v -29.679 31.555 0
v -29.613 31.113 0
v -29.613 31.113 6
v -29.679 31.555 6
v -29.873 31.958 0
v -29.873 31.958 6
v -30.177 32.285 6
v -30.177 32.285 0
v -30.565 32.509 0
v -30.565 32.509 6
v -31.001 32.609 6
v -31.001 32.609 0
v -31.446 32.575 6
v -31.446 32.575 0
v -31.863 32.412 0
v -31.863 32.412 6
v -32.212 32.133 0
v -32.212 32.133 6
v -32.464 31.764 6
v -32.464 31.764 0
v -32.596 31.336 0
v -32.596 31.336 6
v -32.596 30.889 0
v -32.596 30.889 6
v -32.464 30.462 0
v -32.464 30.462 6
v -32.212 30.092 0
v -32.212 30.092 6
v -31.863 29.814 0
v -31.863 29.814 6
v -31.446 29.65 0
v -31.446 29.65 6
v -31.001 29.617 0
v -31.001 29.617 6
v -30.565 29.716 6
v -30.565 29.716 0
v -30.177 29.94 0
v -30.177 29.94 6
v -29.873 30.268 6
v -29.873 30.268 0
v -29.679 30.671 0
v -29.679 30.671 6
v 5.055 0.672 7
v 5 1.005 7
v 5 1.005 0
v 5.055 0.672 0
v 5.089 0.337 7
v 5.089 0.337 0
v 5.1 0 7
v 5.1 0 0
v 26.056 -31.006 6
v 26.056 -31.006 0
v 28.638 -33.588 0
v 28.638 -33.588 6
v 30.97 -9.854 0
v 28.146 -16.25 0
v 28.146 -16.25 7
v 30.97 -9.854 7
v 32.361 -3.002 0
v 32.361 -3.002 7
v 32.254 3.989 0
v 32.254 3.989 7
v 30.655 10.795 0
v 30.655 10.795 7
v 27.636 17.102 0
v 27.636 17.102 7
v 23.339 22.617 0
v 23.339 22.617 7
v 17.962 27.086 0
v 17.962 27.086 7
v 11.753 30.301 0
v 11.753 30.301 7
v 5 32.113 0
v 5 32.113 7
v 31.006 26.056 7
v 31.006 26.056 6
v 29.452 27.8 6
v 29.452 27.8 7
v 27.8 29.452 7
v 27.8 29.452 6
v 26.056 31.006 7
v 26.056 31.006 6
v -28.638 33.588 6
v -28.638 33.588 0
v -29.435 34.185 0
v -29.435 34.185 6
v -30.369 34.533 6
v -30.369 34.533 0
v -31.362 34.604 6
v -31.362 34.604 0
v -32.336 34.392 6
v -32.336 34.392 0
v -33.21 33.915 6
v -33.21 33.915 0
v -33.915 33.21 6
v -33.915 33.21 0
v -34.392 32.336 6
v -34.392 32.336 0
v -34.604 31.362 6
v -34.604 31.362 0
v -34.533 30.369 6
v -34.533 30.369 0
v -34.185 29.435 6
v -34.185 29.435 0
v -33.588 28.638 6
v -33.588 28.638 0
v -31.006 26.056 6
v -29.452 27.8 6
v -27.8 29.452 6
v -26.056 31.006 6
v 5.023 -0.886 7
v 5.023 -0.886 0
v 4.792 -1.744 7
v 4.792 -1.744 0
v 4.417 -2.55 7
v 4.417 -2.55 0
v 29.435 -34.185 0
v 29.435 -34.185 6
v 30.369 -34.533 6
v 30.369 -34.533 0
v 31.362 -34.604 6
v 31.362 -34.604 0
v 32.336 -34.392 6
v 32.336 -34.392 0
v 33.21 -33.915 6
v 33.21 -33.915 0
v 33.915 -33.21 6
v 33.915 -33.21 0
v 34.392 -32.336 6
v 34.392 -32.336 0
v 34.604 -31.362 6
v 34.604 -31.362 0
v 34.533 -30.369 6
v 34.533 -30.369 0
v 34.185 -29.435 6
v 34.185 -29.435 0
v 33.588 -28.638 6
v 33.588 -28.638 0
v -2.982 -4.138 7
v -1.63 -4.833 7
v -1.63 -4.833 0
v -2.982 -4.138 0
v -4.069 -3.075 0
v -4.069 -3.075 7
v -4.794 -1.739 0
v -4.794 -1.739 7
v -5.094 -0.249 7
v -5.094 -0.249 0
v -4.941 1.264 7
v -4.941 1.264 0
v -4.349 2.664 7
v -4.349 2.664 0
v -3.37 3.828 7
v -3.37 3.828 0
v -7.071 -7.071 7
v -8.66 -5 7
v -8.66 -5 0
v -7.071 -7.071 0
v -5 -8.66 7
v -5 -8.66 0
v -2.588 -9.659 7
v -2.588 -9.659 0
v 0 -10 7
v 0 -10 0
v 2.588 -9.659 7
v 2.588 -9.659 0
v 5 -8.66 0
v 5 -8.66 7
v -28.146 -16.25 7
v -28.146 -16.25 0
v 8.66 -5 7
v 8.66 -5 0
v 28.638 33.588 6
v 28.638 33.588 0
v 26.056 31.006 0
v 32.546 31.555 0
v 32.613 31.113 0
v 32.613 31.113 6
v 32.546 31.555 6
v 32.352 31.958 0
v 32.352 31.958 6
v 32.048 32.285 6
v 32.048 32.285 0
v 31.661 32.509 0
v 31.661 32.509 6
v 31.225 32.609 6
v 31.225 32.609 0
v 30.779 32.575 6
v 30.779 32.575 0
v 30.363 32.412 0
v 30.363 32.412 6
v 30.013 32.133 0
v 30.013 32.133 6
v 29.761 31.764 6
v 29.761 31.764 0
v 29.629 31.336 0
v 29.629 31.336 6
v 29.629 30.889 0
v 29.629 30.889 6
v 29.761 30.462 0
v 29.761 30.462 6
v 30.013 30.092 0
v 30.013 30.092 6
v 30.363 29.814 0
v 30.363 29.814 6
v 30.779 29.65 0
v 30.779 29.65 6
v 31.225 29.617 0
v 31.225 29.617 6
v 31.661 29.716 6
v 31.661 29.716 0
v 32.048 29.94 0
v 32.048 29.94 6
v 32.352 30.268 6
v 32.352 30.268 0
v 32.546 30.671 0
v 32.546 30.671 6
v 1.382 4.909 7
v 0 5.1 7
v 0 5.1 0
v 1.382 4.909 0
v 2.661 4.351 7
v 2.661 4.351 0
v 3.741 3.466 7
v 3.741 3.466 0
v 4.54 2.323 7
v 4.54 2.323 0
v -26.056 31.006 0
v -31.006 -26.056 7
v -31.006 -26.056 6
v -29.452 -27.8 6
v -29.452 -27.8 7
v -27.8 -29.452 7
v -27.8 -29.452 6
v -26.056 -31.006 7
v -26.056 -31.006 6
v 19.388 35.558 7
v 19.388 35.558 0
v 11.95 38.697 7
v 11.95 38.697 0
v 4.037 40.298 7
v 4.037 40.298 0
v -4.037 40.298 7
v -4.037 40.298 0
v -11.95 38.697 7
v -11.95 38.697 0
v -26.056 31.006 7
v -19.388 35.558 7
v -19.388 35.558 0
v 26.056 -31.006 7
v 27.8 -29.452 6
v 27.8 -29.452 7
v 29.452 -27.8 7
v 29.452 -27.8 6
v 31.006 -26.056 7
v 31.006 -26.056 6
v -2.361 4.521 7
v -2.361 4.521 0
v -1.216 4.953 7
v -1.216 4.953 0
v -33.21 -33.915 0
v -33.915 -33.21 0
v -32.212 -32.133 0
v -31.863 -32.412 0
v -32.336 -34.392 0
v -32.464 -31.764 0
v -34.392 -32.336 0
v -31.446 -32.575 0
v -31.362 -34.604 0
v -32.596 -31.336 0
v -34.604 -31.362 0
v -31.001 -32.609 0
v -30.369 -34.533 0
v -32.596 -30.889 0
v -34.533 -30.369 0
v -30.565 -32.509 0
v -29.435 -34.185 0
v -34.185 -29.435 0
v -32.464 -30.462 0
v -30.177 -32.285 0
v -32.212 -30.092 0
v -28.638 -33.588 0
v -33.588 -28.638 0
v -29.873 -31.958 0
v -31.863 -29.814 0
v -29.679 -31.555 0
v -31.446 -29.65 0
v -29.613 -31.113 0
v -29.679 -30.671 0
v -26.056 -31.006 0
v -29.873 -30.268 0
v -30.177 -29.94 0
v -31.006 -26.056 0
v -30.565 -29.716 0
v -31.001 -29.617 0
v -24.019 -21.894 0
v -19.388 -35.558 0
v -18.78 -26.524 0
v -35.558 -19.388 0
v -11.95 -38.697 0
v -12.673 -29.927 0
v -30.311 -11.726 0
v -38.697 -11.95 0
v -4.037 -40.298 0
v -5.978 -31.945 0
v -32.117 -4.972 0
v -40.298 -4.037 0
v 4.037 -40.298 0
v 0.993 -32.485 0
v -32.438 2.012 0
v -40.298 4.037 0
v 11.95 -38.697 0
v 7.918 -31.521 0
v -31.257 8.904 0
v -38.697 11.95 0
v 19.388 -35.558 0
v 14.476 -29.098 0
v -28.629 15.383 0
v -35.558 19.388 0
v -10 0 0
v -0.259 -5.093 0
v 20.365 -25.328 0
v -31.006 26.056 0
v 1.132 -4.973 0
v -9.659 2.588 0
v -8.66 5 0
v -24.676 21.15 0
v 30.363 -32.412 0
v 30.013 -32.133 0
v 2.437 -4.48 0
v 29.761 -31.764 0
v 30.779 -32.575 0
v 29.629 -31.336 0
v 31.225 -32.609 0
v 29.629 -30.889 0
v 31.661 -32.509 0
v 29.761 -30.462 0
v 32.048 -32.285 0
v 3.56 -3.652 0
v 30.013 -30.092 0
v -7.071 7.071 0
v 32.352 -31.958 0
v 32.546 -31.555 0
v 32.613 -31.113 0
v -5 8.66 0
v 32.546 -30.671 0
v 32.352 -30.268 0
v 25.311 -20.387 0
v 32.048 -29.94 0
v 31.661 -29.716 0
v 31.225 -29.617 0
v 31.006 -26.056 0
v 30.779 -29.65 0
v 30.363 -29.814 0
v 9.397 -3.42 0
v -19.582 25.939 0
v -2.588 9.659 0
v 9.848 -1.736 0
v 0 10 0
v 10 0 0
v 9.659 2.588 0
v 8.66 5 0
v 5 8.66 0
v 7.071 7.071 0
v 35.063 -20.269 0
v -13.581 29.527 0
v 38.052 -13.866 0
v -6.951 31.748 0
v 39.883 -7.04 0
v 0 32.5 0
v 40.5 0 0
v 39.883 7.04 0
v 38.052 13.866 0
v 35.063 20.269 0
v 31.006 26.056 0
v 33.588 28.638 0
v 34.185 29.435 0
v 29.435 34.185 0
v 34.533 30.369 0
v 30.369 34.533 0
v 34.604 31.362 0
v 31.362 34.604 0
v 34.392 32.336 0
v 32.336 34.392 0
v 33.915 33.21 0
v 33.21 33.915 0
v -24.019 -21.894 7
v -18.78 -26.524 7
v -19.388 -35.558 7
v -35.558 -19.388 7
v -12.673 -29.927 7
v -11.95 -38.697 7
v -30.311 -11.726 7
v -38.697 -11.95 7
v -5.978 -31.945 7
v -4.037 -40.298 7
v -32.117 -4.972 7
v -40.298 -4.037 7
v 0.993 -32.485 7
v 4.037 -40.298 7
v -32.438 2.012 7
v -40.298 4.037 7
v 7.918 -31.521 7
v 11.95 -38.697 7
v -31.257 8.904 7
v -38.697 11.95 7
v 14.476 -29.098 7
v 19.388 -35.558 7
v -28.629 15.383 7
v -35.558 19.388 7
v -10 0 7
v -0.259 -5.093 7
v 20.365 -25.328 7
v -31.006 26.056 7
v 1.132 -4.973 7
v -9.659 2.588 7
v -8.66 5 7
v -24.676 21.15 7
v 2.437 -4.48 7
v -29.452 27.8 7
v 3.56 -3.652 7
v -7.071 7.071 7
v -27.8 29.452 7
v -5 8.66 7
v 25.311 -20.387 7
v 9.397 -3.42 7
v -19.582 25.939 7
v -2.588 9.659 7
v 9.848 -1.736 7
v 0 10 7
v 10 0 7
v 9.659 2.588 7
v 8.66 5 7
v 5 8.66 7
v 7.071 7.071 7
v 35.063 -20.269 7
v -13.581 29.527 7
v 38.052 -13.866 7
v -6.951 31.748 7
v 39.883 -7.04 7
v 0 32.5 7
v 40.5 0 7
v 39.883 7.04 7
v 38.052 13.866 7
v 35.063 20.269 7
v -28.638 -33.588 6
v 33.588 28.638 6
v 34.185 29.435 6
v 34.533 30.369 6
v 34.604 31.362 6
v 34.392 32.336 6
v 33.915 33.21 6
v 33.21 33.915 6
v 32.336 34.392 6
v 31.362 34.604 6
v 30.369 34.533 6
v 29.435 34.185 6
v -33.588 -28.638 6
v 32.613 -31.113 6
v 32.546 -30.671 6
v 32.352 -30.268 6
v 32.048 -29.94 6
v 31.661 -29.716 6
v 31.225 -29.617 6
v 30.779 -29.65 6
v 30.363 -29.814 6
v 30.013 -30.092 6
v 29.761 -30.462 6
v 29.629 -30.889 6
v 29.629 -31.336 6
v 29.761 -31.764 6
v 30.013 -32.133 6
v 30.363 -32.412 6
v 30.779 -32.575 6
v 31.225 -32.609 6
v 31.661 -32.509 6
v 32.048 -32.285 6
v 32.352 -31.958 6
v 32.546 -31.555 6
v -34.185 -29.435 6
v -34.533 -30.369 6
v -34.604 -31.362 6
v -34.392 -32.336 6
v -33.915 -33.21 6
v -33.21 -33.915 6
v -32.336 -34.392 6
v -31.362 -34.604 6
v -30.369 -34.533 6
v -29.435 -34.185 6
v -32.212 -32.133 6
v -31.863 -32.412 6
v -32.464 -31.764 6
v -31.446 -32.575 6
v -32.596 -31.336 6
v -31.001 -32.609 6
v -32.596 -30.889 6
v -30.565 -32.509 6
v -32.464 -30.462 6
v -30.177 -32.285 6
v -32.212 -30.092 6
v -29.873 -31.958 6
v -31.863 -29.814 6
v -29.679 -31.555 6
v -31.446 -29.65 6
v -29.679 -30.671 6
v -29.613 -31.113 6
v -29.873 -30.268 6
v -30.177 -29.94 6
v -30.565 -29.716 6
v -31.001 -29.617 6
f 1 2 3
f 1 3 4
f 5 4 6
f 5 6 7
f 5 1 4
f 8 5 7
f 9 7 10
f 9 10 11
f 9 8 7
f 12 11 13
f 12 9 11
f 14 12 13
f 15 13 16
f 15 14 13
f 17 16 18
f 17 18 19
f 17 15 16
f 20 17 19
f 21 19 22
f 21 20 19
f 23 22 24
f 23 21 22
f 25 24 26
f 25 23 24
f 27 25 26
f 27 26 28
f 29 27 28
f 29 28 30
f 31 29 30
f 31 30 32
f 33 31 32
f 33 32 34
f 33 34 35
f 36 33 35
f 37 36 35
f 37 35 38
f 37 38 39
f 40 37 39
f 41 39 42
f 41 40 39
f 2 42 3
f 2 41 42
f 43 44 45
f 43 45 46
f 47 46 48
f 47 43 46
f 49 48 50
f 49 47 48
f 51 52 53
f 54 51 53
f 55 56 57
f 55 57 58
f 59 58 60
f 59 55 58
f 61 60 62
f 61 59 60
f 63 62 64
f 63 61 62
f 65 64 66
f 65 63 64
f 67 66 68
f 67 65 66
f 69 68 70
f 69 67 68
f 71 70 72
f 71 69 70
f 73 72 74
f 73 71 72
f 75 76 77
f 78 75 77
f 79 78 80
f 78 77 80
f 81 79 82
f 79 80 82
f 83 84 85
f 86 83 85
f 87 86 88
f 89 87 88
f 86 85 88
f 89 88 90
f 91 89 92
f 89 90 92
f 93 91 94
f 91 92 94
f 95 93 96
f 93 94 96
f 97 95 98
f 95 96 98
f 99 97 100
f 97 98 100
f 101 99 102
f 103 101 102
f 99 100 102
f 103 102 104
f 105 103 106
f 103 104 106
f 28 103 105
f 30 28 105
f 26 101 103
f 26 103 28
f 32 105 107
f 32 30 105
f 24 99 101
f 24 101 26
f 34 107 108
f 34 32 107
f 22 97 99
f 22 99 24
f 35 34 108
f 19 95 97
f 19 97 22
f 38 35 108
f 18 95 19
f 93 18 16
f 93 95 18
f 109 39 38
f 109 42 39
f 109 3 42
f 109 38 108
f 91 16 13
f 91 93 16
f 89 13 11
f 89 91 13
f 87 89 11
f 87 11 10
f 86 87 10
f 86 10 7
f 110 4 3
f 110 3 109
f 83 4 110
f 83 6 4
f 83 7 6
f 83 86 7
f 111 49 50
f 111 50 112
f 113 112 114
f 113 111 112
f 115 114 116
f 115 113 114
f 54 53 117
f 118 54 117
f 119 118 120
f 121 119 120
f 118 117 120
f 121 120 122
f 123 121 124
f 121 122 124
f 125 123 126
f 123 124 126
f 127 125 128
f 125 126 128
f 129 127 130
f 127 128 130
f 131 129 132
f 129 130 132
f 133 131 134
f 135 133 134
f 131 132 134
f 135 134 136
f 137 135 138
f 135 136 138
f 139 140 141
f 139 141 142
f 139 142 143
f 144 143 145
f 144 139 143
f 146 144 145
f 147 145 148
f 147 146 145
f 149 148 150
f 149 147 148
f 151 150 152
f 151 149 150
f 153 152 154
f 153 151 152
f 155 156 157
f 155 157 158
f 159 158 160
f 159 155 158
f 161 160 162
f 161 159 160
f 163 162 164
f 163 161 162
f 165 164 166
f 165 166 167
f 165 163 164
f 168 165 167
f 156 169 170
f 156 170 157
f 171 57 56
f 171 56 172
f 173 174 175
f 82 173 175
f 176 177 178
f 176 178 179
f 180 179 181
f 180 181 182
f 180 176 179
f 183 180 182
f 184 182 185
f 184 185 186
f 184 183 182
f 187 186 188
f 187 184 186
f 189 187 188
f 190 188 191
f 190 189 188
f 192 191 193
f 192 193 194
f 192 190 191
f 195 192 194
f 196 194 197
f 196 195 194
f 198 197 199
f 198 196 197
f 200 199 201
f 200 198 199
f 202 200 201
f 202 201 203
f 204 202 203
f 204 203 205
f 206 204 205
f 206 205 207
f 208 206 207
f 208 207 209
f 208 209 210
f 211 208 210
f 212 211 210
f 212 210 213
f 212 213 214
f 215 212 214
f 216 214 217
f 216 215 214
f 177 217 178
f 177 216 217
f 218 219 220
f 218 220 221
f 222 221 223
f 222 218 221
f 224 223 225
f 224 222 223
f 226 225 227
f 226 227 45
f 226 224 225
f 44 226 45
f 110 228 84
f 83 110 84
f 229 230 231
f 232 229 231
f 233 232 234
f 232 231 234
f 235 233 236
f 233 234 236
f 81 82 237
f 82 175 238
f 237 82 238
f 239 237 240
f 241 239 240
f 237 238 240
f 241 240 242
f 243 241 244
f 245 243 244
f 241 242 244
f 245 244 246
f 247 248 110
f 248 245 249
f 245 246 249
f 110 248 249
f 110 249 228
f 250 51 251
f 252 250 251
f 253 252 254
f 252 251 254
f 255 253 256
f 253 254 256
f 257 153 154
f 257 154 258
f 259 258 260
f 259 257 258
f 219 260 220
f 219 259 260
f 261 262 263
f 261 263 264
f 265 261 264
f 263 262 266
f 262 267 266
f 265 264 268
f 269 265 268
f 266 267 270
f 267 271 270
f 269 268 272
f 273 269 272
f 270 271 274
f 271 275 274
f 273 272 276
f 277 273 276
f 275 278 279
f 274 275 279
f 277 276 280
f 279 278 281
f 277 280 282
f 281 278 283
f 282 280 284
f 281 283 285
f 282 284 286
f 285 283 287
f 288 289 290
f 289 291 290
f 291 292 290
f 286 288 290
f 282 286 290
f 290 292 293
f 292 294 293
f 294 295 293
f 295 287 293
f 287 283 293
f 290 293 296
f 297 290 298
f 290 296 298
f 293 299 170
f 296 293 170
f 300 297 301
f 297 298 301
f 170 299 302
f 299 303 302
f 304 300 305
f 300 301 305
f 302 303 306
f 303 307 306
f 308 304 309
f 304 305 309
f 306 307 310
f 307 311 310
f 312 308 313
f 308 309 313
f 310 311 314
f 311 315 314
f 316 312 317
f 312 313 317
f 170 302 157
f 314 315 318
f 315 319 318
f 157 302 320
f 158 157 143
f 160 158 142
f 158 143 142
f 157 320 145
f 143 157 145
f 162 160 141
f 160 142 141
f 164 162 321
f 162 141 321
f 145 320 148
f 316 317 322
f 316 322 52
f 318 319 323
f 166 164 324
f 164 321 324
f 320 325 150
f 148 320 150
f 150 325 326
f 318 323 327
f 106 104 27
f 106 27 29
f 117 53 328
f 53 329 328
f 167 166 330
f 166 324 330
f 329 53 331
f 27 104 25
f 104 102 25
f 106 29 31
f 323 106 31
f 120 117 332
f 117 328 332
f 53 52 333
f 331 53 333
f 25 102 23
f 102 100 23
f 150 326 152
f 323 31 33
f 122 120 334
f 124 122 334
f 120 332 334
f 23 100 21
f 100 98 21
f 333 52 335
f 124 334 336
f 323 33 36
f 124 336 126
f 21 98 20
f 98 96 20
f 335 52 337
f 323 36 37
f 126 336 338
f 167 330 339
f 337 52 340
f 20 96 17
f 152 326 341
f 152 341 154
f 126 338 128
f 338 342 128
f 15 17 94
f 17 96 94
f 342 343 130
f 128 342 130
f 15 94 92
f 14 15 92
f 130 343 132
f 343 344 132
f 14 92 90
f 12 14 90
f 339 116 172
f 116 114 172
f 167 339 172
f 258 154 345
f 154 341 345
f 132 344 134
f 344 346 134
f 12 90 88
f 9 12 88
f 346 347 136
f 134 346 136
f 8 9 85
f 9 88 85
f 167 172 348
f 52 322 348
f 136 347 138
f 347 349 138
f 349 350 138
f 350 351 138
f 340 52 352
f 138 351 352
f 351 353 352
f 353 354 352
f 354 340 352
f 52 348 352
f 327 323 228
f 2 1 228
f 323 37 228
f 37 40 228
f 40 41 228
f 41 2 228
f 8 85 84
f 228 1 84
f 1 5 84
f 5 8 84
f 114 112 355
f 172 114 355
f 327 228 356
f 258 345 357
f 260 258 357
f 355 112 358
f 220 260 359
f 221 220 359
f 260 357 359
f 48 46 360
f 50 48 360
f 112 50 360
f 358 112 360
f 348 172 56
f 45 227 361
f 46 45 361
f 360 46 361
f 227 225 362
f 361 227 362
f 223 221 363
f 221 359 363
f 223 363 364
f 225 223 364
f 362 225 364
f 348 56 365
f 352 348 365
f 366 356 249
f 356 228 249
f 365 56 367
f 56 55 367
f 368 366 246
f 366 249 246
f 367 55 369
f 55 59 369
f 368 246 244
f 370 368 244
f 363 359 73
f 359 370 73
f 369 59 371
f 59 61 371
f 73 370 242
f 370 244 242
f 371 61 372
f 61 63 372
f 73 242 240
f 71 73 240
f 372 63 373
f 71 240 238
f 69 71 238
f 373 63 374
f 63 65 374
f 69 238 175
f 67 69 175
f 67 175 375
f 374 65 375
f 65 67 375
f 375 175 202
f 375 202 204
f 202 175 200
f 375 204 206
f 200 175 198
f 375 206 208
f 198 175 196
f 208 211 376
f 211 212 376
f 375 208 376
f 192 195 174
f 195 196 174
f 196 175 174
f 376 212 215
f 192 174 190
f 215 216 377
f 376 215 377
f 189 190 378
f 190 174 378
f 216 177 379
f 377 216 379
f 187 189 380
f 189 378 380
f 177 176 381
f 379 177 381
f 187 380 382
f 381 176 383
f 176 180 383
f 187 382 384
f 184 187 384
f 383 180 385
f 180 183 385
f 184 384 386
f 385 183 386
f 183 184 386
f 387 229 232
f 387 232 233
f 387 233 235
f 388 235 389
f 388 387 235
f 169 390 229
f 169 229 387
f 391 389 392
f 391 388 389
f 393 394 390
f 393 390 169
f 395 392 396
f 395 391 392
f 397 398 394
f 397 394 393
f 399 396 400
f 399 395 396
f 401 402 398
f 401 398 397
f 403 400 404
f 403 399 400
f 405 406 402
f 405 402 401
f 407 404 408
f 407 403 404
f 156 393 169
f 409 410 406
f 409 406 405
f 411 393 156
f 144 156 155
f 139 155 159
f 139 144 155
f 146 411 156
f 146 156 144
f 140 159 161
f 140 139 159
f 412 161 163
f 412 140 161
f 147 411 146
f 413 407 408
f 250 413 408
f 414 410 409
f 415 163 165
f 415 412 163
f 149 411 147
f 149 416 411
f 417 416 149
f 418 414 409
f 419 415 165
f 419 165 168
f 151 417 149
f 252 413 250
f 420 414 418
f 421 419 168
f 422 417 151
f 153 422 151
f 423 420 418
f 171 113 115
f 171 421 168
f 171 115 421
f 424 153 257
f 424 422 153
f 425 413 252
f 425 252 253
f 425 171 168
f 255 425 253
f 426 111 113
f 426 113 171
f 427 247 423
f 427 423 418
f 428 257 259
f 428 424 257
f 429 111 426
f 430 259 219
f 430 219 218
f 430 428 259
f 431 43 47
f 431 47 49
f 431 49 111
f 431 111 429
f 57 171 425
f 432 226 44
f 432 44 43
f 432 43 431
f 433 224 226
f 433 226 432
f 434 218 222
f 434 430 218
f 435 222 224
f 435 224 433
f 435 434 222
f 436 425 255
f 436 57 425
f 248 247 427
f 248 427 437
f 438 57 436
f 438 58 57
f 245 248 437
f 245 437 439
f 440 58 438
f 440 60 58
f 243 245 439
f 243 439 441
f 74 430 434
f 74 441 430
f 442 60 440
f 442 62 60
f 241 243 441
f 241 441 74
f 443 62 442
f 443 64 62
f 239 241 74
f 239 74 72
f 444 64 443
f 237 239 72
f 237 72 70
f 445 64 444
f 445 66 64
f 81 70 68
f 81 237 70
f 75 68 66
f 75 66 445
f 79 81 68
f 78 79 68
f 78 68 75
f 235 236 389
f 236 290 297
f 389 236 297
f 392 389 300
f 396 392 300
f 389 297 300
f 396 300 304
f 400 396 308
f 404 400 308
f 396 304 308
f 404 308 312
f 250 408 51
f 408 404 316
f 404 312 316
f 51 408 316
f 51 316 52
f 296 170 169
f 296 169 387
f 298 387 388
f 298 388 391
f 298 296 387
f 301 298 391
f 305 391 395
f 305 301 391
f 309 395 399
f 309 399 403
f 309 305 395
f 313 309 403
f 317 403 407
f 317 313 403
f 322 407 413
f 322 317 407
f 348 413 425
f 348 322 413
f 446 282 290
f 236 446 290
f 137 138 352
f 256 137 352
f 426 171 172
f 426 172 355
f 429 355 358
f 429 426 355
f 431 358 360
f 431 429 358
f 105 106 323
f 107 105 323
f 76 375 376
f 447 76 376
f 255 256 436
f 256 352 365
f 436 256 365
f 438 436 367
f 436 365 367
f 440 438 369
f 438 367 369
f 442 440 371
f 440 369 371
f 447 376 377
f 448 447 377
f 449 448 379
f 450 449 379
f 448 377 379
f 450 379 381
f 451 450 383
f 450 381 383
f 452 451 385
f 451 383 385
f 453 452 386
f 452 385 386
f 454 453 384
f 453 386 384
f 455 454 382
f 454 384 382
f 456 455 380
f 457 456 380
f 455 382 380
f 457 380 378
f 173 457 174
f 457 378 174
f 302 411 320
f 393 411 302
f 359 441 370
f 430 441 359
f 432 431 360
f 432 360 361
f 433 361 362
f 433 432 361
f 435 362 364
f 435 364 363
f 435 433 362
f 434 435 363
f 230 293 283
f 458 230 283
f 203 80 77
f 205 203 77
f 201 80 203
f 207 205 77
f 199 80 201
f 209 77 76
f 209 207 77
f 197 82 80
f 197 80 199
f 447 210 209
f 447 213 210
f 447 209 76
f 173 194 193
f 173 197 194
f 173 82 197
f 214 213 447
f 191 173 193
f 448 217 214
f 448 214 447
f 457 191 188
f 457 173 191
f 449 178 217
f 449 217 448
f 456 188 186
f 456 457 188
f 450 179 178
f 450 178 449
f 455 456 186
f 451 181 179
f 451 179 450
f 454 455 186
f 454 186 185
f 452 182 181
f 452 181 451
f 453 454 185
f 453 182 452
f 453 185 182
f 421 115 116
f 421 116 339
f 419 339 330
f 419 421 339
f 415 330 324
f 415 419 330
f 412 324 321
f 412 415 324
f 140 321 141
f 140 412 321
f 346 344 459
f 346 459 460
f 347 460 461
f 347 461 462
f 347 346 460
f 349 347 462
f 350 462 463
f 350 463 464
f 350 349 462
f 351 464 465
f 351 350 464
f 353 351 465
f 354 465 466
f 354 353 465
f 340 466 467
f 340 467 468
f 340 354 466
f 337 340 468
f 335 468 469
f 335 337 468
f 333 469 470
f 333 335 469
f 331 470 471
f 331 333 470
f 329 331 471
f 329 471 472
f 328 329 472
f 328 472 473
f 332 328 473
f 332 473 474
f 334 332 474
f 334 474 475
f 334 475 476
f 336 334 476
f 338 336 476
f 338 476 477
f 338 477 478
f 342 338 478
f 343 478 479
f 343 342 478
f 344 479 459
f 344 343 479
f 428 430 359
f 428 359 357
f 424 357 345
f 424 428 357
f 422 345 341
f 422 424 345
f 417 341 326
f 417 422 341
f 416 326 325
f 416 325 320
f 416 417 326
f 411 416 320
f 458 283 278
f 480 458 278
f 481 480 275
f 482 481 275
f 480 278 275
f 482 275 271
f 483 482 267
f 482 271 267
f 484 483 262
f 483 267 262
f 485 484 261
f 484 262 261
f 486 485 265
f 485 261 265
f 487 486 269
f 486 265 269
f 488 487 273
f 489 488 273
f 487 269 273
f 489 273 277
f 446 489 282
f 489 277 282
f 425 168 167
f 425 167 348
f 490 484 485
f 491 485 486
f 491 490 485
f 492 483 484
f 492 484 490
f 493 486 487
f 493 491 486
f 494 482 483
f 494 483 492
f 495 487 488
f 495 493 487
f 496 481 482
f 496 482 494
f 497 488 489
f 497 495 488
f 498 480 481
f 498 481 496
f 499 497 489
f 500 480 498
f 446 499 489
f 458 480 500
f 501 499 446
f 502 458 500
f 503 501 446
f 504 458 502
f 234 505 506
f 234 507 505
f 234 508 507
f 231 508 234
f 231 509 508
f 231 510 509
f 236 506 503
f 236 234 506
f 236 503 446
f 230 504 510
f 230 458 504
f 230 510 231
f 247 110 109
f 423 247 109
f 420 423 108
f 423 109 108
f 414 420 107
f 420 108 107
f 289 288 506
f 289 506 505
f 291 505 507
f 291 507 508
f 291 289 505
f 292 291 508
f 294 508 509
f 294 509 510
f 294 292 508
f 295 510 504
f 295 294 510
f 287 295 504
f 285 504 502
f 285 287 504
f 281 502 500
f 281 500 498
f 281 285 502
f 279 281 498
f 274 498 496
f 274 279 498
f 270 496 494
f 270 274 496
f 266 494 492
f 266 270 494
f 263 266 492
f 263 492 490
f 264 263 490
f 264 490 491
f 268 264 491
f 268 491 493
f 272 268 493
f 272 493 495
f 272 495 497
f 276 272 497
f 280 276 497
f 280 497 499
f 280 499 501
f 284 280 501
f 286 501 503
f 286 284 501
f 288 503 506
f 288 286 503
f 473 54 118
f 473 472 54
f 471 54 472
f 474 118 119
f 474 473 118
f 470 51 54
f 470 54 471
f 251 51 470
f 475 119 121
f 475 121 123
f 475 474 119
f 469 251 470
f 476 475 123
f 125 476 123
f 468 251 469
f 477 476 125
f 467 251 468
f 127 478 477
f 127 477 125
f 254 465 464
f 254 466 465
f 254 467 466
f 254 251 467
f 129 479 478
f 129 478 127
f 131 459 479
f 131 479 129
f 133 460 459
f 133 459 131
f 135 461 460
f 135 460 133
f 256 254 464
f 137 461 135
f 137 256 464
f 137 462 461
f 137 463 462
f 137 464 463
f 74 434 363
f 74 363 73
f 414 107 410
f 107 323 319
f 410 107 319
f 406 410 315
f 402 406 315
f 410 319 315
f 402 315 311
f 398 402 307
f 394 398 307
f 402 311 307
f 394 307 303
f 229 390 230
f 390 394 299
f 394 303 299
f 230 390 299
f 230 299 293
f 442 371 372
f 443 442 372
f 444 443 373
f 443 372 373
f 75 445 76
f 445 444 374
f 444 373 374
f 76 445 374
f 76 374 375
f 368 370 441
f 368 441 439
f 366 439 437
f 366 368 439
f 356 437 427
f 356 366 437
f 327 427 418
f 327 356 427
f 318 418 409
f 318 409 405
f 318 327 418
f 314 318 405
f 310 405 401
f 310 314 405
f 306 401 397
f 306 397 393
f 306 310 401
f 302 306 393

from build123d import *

# Parameters (mm, degrees)
F0_R     = 37
F1_DEPTH = 7
F0_R_2   = 1.5
F2_DEPTH = 6
F0_R_3   = 32.5
F3_DEPTH = 7
F5_DEPTH = 7


with BuildPart() as f1:
    # F0 (on Top) → F1 (new body)
    with BuildSketch(Plane.XY):
        with BuildLine():
            ThreePointArc((31.0055589695, -26.0558115012), (38.0524318426, -13.8658728851), (40.5, 0))
            ThreePointArc((40.5, 0), (38.0524318426, 13.8658728851), (31.0055589695, 26.0558115012))
            ThreePointArc((31.0055589695, 26.0558115012), (28.6378246381, 28.6378246381), (26.0558115012, 31.0055589695))
            ThreePointArc((26.0558115012, 31.0055589695), (0, 40.5), (-26.0558115012, 31.0055589695))
            ThreePointArc((-26.0558115012, 31.0055589695), (-28.6378246381, 28.6378246381), (-31.0055589695, 26.0558115012))
            ThreePointArc((-31.0055589695, 26.0558115012), (-40.5, 0), (-31.0055589695, -26.0558115012))
            ThreePointArc((-31.0055589695, -26.0558115012), (-28.6378246381, -28.6378246381), (-26.0558115012, -31.0055589695))
            ThreePointArc((-26.0558115012, -31.0055589695), (0, -40.5), (26.0558115012, -31.0055589695))
            ThreePointArc((26.0558115012, -31.0055589695), (28.6378246381, -28.6378246381), (31.0055589695, -26.0558115012))
        make_face()
        Circle(F0_R, mode=Mode.SUBTRACT)
    extrude(amount=F1_DEPTH)

    # F0 (on Top) → F2 (join)
    with BuildSketch(Plane.XY):
        with BuildLine():
            Line((-28.6378246381, -33.5875721064), (-26.0558115012, -31.0055589695))
            ThreePointArc((-26.0558115012, -31.0055589695), (-28.6378246381, -28.6378246381), (-31.0055589695, -26.0558115012))
            Line((-31.0055589695, -26.0558115012), (-33.5875721064, -28.6378246381))
            ThreePointArc((-33.5875721064, -28.6378246381), (-33.5875721064, -33.5875721064), (-28.6378246381, -33.5875721064))
        make_face()
        with Locations((-31.1126983722, -31.1126983722)):
            Circle(F0_R_2, mode=Mode.SUBTRACT)
        with BuildLine():
            Line((33.5875721064, -28.6378246381), (31.0055589695, -26.0558115012))
            ThreePointArc((31.0055589695, -26.0558115012), (28.6378246381, -28.6378246381), (26.0558115012, -31.0055589695))
            Line((26.0558115012, -31.0055589695), (28.6378246381, -33.5875721064))
            ThreePointArc((28.6378246381, -33.5875721064), (33.5875721064, -33.5875721064), (33.5875721064, -28.6378246381))
        make_face()
        with Locations((31.1126983722, -31.1126983722)):
            Circle(F0_R_2, mode=Mode.SUBTRACT)
        with BuildLine():
            ThreePointArc((26.0558115012, 31.0055589695), (28.6378246381, 28.6378246381), (31.0055589695, 26.0558115012))
            Line((31.0055589695, 26.0558115012), (33.5875721064, 28.6378246381))
            ThreePointArc((33.5875721064, 28.6378246381), (33.5875721064, 33.5875721064), (28.6378246381, 33.5875721064))
            Line((28.6378246381, 33.5875721064), (26.0558115012, 31.0055589695))
        make_face()
        with Locations((31.1126983722, 31.1126983722)):
            Circle(F0_R_2, mode=Mode.SUBTRACT)
        with BuildLine():
            ThreePointArc((-31.0055589695, 26.0558115012), (-28.6378246381, 28.6378246381), (-26.0558115012, 31.0055589695))
            Line((-26.0558115012, 31.0055589695), (-28.6378246381, 33.5875721064))
            ThreePointArc((-28.6378246381, 33.5875721064), (-33.5875721064, 33.5875721064), (-33.5875721064, 28.6378246381))
            Line((-33.5875721064, 28.6378246381), (-31.0055589695, 26.0558115012))
        make_face()
        with Locations((-31.1126983722, 31.1126983722)):
            Circle(F0_R_2, mode=Mode.SUBTRACT)
    extrude(amount=F2_DEPTH)

    # F0 (on Top) → F3 (join)
    with BuildSketch(Plane.XY):
        Circle(F0_R)
        Circle(F0_R_3, mode=Mode.SUBTRACT)
    extrude(amount=F3_DEPTH)

    # F4 (on face) → F5 (join)
    with BuildSketch(Plane.XY.offset(7)):
        with BuildLine():
            ThreePointArc((0, 10), (2.588190451, 9.6592582629), (5, 8.6602540378))
            Line((5, 8.6602540378), (5, 32.1130814467))
            ThreePointArc((5, 32.1130814467), (2.5074741258, 32.4031259836), (0, 32.5))
            Line((0, 32.5), (0, 10))
        make_face()
        with BuildLine():
            ThreePointArc((5, 1.0049875621), (5.0749384233, 0.5049752469), (5.1, 0))
            ThreePointArc((5.1, 0), (4.9262217141, -1.31997713), (4.4167295593, -2.55))
            Line((4.4167295593, -2.55), (8.6602540378, -5))
            ThreePointArc((8.6602540378, -5), (9.6592582629, -2.588190451), (10, 0))
            ThreePointArc((10, 0), (8.6602540378, 5), (5, 8.6602540378))
            Line((5, 8.6602540378), (5, 1.0049875621))
        make_face()
        with BuildLine():
            ThreePointArc((0, 5.1), (3.2314519518, 3.9455947946), (5, 1.0049875621))
            Line((5, 1.0049875621), (5, 8.6602540378))
            ThreePointArc((5, 8.6602540378), (2.588190451, 9.6592582629), (0, 10))
            Line((0, 10), (0, 5.1))
        make_face()
        with BuildLine():
            ThreePointArc((-3.3703447593, 3.8276332379), (-1.8012593493, 4.7713168787), (0, 5.1))
            Line((0, 5.1), (0, 10))
            ThreePointArc((0, 10), (-7.0710678119, 7.0710678119), (-10, 0))
            Line((-10, 0), (-3.3703447593, 3.8276332379))
        make_face()
        with BuildLine():
            ThreePointArc((-4.4167295593, -2.55), (-5.0327113011, 0.825722084), (-3.3703447593, 3.8276332379))
            Line((-3.3703447593, 3.8276332379), (-10, 0))
            ThreePointArc((-10, 0), (-9.6592582629, -2.588190451), (-8.6602540378, -5))
            Line((-8.6602540378, -5), (-4.4167295593, -2.55))
        make_face()
        with BuildLine():
            Line((5, -8.6602540378), (-1.6296552407, -4.8326208))
            ThreePointArc((-1.6296552407, -4.8326208), (-3.2314519518, -3.9455947946), (-4.4167295593, -2.55))
            Line((-4.4167295593, -2.55), (-8.6602540378, -5))
            ThreePointArc((-8.6602540378, -5), (-2.588190451, -9.6592582629), (5, -8.6602540378))
        make_face()
        with BuildLine():
            Line((8.6602540378, -5), (4.4167295593, -2.55))
            ThreePointArc((4.4167295593, -2.55), (1.8012593493, -4.7713168787), (-1.6296552407, -4.8326208))
            Line((-1.6296552407, -4.8326208), (5, -8.6602540378))
            ThreePointArc((5, -8.6602540378), (7.0710678119, -7.0710678119), (8.6602540378, -5))
        make_face()
        with BuildLine():
            Line((28.145825623, -16.25), (8.6602540378, -5))
            ThreePointArc((8.6602540378, -5), (7.0710678119, -7.0710678119), (5, -8.6602540378))
            Line((5, -8.6602540378), (25.3107443266, -20.3866677423))
            ThreePointArc((25.3107443266, -20.3866677423), (26.8081932009, -18.3730992841), (28.145825623, -16.25))
        make_face()
        with BuildLine():
            ThreePointArc((-8.6602540378, -5), (-9.6592582629, -2.588190451), (-10, 0))
            Line((-10, 0), (-30.3107443266, -11.7264137044))
            ThreePointArc((-30.3107443266, -11.7264137044), (-29.3156673267, -14.0300266995), (-28.145825623, -16.25))
            Line((-28.145825623, -16.25), (-8.6602540378, -5))
        make_face()
    extrude(amount=-F5_DEPTH)


solid = f1.part
